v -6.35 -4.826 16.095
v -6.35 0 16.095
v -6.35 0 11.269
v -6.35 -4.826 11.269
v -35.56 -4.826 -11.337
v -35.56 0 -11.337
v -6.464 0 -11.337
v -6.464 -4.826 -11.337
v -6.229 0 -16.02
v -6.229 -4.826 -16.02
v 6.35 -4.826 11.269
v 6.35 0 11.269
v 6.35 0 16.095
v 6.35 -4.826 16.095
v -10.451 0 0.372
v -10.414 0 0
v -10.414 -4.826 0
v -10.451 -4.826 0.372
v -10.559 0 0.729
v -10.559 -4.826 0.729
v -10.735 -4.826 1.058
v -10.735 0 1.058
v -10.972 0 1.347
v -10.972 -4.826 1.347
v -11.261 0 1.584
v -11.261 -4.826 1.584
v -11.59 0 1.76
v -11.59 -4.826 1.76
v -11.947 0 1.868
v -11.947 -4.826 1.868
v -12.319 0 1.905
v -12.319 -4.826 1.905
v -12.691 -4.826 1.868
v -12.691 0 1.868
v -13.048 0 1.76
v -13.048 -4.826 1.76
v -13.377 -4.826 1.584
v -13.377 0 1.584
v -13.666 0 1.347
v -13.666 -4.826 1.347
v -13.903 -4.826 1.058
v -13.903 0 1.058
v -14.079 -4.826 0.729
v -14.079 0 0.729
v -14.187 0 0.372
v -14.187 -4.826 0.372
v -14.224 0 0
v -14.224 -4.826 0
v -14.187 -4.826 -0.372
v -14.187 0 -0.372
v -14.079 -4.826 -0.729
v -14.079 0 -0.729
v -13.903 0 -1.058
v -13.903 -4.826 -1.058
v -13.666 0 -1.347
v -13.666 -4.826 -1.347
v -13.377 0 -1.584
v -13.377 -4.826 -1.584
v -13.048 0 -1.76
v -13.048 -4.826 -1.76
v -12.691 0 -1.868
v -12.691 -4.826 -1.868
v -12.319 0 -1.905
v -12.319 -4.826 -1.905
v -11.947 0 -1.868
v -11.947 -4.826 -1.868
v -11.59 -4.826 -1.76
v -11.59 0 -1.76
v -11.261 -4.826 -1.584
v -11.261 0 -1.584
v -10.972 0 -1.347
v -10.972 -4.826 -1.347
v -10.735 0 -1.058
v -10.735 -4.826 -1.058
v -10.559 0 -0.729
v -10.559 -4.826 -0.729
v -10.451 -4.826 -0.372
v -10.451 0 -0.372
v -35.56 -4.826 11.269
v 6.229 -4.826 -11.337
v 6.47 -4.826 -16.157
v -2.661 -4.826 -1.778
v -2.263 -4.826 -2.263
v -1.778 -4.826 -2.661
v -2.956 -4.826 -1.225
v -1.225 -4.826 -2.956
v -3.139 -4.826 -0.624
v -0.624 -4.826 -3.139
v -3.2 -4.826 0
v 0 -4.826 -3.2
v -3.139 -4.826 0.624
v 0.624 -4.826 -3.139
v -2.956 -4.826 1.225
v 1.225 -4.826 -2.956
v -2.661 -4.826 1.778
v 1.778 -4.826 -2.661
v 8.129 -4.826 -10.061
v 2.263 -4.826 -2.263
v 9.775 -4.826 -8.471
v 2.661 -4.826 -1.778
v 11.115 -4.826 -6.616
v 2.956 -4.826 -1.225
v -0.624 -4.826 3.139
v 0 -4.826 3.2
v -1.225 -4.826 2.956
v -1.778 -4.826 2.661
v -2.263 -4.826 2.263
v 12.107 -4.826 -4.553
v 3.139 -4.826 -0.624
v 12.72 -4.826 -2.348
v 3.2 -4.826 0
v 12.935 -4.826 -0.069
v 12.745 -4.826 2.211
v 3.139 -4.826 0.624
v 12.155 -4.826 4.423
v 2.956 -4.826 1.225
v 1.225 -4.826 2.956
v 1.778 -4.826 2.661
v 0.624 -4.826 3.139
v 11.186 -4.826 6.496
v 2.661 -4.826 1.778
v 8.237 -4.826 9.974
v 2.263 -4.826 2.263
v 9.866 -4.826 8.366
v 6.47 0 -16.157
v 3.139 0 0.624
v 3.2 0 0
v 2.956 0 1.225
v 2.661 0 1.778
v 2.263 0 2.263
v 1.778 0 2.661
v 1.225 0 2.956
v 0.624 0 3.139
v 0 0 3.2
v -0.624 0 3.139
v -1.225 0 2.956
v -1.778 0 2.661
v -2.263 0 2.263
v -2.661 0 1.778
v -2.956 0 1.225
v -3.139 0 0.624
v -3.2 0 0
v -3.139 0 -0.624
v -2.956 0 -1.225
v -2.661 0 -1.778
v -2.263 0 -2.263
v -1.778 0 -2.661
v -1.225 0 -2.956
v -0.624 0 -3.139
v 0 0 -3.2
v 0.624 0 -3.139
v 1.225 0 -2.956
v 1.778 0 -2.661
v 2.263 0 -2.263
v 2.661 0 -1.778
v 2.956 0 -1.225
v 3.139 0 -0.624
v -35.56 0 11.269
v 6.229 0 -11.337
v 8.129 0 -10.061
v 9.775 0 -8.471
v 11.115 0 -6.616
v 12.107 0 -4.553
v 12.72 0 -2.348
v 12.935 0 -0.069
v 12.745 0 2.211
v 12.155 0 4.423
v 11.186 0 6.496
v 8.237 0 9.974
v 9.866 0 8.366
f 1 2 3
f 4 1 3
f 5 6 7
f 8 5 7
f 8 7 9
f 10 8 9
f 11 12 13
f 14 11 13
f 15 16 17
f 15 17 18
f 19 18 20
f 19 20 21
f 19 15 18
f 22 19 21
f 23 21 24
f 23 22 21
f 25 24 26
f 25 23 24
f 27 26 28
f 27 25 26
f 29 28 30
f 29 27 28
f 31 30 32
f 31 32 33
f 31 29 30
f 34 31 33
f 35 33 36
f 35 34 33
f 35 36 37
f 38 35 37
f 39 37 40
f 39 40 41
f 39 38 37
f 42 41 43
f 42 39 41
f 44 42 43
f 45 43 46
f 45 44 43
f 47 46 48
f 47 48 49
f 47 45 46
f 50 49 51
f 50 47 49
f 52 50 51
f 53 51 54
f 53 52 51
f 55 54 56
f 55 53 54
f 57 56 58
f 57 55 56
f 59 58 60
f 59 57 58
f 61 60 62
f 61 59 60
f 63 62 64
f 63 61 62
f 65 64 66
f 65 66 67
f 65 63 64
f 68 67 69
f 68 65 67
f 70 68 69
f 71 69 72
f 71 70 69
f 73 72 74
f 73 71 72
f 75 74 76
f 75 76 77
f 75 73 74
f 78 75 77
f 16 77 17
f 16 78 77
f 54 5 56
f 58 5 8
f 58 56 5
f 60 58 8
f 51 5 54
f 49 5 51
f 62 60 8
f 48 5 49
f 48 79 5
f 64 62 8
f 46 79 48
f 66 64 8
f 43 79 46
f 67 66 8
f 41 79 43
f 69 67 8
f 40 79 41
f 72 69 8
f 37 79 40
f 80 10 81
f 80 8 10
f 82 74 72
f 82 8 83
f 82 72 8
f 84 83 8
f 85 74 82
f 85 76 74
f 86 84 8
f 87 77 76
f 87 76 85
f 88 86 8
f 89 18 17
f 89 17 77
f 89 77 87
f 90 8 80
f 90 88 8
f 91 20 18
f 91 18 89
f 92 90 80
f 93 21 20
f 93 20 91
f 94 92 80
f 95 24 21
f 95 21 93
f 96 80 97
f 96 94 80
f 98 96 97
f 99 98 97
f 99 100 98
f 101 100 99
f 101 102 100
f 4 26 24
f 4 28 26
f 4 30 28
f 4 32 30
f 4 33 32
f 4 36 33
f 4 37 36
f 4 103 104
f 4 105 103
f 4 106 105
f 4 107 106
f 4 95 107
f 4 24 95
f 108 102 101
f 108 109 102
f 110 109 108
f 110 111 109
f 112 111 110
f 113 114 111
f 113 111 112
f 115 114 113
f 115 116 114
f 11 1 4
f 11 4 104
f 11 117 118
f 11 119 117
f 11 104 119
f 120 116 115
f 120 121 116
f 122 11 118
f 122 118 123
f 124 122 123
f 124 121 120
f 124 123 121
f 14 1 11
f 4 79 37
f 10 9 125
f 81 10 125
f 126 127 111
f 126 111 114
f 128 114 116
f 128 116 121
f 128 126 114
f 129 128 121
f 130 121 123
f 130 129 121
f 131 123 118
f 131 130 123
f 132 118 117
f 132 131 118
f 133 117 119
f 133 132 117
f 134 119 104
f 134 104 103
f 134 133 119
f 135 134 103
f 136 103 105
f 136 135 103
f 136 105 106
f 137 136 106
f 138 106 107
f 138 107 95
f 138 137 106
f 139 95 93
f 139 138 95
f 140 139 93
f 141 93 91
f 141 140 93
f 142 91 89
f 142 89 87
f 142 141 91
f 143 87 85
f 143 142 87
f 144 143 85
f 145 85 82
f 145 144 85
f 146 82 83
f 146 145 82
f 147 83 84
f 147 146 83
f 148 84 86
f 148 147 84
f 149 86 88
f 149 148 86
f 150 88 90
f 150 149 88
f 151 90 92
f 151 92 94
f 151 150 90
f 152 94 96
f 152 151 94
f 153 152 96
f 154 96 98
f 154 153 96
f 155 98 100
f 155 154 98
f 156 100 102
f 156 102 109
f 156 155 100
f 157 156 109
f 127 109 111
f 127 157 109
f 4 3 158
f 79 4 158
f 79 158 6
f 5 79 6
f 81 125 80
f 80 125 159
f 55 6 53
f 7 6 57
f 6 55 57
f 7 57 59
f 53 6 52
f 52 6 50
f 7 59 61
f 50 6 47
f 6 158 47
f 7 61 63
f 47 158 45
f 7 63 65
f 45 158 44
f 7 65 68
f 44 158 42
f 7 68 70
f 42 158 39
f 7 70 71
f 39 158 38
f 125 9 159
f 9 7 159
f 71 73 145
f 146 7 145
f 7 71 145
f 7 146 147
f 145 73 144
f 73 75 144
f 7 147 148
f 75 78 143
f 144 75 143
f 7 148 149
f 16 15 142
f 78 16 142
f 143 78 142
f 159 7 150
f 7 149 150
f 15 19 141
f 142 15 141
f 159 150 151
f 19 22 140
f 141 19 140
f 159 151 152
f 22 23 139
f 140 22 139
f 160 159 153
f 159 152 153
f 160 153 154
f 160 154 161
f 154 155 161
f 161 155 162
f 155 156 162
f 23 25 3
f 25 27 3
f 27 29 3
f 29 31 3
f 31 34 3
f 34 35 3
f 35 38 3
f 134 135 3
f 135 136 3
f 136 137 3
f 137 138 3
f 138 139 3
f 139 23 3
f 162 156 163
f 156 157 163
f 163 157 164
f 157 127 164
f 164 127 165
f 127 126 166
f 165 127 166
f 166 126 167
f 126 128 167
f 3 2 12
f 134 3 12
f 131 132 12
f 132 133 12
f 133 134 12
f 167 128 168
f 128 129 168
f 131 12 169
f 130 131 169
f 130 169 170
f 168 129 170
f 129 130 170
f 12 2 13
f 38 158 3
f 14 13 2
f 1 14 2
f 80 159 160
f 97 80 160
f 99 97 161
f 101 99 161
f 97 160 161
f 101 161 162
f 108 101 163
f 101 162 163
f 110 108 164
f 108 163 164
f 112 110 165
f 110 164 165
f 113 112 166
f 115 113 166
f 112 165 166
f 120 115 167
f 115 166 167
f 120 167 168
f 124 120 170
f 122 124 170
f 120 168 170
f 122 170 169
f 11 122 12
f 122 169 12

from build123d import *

# Parameters (mm, degrees)
F0_R     = 1.905
F0_R_2   = 3.2
F1_DEPTH = 4.826


# Not quite as in the source:
# - a feature names something its author has since deleted; it is built from what else it names


with BuildPart() as f1:
    # F0 (on Front) → F1 (new body)
    with BuildSketch(Plane.XZ):
        with BuildLine():
            Line((-6.2288098753, -16.020498732), (6.4704601492, -16.156663498))
            Line((6.4704601492, -16.156663498), (6.2288098753, -11.3367173214))
            ThreePointArc((6.2288098753, -11.3367173214), (12.9350076718, -0.0693442092), (6.35, 11.2692826786))
            Line((6.35, 11.2692826786), (6.35, 16.0952826786))
            Line((6.35, 16.0952826786), (-6.35, 16.0952826786))
            Line((-6.35, 16.0952826786), (-6.35, 11.2692826786))
            Line((-6.35, 11.2692826786), (-35.56, 11.2692826786))
            Line((-35.56, 11.2692826786), (-35.56, -11.3367173214))
            Line((-35.56, -11.3367173214), (-6.4636334645, -11.3367173214))
            Line((-6.4636334645, -11.3367173214), (-6.2288098753, -16.020498732))
        make_face()
        with Locations((-12.319, 0)):
            Circle(F0_R, mode=Mode.SUBTRACT)
        Circle(F0_R_2, mode=Mode.SUBTRACT)
    extrude(amount=F1_DEPTH)


solid = f1.part
